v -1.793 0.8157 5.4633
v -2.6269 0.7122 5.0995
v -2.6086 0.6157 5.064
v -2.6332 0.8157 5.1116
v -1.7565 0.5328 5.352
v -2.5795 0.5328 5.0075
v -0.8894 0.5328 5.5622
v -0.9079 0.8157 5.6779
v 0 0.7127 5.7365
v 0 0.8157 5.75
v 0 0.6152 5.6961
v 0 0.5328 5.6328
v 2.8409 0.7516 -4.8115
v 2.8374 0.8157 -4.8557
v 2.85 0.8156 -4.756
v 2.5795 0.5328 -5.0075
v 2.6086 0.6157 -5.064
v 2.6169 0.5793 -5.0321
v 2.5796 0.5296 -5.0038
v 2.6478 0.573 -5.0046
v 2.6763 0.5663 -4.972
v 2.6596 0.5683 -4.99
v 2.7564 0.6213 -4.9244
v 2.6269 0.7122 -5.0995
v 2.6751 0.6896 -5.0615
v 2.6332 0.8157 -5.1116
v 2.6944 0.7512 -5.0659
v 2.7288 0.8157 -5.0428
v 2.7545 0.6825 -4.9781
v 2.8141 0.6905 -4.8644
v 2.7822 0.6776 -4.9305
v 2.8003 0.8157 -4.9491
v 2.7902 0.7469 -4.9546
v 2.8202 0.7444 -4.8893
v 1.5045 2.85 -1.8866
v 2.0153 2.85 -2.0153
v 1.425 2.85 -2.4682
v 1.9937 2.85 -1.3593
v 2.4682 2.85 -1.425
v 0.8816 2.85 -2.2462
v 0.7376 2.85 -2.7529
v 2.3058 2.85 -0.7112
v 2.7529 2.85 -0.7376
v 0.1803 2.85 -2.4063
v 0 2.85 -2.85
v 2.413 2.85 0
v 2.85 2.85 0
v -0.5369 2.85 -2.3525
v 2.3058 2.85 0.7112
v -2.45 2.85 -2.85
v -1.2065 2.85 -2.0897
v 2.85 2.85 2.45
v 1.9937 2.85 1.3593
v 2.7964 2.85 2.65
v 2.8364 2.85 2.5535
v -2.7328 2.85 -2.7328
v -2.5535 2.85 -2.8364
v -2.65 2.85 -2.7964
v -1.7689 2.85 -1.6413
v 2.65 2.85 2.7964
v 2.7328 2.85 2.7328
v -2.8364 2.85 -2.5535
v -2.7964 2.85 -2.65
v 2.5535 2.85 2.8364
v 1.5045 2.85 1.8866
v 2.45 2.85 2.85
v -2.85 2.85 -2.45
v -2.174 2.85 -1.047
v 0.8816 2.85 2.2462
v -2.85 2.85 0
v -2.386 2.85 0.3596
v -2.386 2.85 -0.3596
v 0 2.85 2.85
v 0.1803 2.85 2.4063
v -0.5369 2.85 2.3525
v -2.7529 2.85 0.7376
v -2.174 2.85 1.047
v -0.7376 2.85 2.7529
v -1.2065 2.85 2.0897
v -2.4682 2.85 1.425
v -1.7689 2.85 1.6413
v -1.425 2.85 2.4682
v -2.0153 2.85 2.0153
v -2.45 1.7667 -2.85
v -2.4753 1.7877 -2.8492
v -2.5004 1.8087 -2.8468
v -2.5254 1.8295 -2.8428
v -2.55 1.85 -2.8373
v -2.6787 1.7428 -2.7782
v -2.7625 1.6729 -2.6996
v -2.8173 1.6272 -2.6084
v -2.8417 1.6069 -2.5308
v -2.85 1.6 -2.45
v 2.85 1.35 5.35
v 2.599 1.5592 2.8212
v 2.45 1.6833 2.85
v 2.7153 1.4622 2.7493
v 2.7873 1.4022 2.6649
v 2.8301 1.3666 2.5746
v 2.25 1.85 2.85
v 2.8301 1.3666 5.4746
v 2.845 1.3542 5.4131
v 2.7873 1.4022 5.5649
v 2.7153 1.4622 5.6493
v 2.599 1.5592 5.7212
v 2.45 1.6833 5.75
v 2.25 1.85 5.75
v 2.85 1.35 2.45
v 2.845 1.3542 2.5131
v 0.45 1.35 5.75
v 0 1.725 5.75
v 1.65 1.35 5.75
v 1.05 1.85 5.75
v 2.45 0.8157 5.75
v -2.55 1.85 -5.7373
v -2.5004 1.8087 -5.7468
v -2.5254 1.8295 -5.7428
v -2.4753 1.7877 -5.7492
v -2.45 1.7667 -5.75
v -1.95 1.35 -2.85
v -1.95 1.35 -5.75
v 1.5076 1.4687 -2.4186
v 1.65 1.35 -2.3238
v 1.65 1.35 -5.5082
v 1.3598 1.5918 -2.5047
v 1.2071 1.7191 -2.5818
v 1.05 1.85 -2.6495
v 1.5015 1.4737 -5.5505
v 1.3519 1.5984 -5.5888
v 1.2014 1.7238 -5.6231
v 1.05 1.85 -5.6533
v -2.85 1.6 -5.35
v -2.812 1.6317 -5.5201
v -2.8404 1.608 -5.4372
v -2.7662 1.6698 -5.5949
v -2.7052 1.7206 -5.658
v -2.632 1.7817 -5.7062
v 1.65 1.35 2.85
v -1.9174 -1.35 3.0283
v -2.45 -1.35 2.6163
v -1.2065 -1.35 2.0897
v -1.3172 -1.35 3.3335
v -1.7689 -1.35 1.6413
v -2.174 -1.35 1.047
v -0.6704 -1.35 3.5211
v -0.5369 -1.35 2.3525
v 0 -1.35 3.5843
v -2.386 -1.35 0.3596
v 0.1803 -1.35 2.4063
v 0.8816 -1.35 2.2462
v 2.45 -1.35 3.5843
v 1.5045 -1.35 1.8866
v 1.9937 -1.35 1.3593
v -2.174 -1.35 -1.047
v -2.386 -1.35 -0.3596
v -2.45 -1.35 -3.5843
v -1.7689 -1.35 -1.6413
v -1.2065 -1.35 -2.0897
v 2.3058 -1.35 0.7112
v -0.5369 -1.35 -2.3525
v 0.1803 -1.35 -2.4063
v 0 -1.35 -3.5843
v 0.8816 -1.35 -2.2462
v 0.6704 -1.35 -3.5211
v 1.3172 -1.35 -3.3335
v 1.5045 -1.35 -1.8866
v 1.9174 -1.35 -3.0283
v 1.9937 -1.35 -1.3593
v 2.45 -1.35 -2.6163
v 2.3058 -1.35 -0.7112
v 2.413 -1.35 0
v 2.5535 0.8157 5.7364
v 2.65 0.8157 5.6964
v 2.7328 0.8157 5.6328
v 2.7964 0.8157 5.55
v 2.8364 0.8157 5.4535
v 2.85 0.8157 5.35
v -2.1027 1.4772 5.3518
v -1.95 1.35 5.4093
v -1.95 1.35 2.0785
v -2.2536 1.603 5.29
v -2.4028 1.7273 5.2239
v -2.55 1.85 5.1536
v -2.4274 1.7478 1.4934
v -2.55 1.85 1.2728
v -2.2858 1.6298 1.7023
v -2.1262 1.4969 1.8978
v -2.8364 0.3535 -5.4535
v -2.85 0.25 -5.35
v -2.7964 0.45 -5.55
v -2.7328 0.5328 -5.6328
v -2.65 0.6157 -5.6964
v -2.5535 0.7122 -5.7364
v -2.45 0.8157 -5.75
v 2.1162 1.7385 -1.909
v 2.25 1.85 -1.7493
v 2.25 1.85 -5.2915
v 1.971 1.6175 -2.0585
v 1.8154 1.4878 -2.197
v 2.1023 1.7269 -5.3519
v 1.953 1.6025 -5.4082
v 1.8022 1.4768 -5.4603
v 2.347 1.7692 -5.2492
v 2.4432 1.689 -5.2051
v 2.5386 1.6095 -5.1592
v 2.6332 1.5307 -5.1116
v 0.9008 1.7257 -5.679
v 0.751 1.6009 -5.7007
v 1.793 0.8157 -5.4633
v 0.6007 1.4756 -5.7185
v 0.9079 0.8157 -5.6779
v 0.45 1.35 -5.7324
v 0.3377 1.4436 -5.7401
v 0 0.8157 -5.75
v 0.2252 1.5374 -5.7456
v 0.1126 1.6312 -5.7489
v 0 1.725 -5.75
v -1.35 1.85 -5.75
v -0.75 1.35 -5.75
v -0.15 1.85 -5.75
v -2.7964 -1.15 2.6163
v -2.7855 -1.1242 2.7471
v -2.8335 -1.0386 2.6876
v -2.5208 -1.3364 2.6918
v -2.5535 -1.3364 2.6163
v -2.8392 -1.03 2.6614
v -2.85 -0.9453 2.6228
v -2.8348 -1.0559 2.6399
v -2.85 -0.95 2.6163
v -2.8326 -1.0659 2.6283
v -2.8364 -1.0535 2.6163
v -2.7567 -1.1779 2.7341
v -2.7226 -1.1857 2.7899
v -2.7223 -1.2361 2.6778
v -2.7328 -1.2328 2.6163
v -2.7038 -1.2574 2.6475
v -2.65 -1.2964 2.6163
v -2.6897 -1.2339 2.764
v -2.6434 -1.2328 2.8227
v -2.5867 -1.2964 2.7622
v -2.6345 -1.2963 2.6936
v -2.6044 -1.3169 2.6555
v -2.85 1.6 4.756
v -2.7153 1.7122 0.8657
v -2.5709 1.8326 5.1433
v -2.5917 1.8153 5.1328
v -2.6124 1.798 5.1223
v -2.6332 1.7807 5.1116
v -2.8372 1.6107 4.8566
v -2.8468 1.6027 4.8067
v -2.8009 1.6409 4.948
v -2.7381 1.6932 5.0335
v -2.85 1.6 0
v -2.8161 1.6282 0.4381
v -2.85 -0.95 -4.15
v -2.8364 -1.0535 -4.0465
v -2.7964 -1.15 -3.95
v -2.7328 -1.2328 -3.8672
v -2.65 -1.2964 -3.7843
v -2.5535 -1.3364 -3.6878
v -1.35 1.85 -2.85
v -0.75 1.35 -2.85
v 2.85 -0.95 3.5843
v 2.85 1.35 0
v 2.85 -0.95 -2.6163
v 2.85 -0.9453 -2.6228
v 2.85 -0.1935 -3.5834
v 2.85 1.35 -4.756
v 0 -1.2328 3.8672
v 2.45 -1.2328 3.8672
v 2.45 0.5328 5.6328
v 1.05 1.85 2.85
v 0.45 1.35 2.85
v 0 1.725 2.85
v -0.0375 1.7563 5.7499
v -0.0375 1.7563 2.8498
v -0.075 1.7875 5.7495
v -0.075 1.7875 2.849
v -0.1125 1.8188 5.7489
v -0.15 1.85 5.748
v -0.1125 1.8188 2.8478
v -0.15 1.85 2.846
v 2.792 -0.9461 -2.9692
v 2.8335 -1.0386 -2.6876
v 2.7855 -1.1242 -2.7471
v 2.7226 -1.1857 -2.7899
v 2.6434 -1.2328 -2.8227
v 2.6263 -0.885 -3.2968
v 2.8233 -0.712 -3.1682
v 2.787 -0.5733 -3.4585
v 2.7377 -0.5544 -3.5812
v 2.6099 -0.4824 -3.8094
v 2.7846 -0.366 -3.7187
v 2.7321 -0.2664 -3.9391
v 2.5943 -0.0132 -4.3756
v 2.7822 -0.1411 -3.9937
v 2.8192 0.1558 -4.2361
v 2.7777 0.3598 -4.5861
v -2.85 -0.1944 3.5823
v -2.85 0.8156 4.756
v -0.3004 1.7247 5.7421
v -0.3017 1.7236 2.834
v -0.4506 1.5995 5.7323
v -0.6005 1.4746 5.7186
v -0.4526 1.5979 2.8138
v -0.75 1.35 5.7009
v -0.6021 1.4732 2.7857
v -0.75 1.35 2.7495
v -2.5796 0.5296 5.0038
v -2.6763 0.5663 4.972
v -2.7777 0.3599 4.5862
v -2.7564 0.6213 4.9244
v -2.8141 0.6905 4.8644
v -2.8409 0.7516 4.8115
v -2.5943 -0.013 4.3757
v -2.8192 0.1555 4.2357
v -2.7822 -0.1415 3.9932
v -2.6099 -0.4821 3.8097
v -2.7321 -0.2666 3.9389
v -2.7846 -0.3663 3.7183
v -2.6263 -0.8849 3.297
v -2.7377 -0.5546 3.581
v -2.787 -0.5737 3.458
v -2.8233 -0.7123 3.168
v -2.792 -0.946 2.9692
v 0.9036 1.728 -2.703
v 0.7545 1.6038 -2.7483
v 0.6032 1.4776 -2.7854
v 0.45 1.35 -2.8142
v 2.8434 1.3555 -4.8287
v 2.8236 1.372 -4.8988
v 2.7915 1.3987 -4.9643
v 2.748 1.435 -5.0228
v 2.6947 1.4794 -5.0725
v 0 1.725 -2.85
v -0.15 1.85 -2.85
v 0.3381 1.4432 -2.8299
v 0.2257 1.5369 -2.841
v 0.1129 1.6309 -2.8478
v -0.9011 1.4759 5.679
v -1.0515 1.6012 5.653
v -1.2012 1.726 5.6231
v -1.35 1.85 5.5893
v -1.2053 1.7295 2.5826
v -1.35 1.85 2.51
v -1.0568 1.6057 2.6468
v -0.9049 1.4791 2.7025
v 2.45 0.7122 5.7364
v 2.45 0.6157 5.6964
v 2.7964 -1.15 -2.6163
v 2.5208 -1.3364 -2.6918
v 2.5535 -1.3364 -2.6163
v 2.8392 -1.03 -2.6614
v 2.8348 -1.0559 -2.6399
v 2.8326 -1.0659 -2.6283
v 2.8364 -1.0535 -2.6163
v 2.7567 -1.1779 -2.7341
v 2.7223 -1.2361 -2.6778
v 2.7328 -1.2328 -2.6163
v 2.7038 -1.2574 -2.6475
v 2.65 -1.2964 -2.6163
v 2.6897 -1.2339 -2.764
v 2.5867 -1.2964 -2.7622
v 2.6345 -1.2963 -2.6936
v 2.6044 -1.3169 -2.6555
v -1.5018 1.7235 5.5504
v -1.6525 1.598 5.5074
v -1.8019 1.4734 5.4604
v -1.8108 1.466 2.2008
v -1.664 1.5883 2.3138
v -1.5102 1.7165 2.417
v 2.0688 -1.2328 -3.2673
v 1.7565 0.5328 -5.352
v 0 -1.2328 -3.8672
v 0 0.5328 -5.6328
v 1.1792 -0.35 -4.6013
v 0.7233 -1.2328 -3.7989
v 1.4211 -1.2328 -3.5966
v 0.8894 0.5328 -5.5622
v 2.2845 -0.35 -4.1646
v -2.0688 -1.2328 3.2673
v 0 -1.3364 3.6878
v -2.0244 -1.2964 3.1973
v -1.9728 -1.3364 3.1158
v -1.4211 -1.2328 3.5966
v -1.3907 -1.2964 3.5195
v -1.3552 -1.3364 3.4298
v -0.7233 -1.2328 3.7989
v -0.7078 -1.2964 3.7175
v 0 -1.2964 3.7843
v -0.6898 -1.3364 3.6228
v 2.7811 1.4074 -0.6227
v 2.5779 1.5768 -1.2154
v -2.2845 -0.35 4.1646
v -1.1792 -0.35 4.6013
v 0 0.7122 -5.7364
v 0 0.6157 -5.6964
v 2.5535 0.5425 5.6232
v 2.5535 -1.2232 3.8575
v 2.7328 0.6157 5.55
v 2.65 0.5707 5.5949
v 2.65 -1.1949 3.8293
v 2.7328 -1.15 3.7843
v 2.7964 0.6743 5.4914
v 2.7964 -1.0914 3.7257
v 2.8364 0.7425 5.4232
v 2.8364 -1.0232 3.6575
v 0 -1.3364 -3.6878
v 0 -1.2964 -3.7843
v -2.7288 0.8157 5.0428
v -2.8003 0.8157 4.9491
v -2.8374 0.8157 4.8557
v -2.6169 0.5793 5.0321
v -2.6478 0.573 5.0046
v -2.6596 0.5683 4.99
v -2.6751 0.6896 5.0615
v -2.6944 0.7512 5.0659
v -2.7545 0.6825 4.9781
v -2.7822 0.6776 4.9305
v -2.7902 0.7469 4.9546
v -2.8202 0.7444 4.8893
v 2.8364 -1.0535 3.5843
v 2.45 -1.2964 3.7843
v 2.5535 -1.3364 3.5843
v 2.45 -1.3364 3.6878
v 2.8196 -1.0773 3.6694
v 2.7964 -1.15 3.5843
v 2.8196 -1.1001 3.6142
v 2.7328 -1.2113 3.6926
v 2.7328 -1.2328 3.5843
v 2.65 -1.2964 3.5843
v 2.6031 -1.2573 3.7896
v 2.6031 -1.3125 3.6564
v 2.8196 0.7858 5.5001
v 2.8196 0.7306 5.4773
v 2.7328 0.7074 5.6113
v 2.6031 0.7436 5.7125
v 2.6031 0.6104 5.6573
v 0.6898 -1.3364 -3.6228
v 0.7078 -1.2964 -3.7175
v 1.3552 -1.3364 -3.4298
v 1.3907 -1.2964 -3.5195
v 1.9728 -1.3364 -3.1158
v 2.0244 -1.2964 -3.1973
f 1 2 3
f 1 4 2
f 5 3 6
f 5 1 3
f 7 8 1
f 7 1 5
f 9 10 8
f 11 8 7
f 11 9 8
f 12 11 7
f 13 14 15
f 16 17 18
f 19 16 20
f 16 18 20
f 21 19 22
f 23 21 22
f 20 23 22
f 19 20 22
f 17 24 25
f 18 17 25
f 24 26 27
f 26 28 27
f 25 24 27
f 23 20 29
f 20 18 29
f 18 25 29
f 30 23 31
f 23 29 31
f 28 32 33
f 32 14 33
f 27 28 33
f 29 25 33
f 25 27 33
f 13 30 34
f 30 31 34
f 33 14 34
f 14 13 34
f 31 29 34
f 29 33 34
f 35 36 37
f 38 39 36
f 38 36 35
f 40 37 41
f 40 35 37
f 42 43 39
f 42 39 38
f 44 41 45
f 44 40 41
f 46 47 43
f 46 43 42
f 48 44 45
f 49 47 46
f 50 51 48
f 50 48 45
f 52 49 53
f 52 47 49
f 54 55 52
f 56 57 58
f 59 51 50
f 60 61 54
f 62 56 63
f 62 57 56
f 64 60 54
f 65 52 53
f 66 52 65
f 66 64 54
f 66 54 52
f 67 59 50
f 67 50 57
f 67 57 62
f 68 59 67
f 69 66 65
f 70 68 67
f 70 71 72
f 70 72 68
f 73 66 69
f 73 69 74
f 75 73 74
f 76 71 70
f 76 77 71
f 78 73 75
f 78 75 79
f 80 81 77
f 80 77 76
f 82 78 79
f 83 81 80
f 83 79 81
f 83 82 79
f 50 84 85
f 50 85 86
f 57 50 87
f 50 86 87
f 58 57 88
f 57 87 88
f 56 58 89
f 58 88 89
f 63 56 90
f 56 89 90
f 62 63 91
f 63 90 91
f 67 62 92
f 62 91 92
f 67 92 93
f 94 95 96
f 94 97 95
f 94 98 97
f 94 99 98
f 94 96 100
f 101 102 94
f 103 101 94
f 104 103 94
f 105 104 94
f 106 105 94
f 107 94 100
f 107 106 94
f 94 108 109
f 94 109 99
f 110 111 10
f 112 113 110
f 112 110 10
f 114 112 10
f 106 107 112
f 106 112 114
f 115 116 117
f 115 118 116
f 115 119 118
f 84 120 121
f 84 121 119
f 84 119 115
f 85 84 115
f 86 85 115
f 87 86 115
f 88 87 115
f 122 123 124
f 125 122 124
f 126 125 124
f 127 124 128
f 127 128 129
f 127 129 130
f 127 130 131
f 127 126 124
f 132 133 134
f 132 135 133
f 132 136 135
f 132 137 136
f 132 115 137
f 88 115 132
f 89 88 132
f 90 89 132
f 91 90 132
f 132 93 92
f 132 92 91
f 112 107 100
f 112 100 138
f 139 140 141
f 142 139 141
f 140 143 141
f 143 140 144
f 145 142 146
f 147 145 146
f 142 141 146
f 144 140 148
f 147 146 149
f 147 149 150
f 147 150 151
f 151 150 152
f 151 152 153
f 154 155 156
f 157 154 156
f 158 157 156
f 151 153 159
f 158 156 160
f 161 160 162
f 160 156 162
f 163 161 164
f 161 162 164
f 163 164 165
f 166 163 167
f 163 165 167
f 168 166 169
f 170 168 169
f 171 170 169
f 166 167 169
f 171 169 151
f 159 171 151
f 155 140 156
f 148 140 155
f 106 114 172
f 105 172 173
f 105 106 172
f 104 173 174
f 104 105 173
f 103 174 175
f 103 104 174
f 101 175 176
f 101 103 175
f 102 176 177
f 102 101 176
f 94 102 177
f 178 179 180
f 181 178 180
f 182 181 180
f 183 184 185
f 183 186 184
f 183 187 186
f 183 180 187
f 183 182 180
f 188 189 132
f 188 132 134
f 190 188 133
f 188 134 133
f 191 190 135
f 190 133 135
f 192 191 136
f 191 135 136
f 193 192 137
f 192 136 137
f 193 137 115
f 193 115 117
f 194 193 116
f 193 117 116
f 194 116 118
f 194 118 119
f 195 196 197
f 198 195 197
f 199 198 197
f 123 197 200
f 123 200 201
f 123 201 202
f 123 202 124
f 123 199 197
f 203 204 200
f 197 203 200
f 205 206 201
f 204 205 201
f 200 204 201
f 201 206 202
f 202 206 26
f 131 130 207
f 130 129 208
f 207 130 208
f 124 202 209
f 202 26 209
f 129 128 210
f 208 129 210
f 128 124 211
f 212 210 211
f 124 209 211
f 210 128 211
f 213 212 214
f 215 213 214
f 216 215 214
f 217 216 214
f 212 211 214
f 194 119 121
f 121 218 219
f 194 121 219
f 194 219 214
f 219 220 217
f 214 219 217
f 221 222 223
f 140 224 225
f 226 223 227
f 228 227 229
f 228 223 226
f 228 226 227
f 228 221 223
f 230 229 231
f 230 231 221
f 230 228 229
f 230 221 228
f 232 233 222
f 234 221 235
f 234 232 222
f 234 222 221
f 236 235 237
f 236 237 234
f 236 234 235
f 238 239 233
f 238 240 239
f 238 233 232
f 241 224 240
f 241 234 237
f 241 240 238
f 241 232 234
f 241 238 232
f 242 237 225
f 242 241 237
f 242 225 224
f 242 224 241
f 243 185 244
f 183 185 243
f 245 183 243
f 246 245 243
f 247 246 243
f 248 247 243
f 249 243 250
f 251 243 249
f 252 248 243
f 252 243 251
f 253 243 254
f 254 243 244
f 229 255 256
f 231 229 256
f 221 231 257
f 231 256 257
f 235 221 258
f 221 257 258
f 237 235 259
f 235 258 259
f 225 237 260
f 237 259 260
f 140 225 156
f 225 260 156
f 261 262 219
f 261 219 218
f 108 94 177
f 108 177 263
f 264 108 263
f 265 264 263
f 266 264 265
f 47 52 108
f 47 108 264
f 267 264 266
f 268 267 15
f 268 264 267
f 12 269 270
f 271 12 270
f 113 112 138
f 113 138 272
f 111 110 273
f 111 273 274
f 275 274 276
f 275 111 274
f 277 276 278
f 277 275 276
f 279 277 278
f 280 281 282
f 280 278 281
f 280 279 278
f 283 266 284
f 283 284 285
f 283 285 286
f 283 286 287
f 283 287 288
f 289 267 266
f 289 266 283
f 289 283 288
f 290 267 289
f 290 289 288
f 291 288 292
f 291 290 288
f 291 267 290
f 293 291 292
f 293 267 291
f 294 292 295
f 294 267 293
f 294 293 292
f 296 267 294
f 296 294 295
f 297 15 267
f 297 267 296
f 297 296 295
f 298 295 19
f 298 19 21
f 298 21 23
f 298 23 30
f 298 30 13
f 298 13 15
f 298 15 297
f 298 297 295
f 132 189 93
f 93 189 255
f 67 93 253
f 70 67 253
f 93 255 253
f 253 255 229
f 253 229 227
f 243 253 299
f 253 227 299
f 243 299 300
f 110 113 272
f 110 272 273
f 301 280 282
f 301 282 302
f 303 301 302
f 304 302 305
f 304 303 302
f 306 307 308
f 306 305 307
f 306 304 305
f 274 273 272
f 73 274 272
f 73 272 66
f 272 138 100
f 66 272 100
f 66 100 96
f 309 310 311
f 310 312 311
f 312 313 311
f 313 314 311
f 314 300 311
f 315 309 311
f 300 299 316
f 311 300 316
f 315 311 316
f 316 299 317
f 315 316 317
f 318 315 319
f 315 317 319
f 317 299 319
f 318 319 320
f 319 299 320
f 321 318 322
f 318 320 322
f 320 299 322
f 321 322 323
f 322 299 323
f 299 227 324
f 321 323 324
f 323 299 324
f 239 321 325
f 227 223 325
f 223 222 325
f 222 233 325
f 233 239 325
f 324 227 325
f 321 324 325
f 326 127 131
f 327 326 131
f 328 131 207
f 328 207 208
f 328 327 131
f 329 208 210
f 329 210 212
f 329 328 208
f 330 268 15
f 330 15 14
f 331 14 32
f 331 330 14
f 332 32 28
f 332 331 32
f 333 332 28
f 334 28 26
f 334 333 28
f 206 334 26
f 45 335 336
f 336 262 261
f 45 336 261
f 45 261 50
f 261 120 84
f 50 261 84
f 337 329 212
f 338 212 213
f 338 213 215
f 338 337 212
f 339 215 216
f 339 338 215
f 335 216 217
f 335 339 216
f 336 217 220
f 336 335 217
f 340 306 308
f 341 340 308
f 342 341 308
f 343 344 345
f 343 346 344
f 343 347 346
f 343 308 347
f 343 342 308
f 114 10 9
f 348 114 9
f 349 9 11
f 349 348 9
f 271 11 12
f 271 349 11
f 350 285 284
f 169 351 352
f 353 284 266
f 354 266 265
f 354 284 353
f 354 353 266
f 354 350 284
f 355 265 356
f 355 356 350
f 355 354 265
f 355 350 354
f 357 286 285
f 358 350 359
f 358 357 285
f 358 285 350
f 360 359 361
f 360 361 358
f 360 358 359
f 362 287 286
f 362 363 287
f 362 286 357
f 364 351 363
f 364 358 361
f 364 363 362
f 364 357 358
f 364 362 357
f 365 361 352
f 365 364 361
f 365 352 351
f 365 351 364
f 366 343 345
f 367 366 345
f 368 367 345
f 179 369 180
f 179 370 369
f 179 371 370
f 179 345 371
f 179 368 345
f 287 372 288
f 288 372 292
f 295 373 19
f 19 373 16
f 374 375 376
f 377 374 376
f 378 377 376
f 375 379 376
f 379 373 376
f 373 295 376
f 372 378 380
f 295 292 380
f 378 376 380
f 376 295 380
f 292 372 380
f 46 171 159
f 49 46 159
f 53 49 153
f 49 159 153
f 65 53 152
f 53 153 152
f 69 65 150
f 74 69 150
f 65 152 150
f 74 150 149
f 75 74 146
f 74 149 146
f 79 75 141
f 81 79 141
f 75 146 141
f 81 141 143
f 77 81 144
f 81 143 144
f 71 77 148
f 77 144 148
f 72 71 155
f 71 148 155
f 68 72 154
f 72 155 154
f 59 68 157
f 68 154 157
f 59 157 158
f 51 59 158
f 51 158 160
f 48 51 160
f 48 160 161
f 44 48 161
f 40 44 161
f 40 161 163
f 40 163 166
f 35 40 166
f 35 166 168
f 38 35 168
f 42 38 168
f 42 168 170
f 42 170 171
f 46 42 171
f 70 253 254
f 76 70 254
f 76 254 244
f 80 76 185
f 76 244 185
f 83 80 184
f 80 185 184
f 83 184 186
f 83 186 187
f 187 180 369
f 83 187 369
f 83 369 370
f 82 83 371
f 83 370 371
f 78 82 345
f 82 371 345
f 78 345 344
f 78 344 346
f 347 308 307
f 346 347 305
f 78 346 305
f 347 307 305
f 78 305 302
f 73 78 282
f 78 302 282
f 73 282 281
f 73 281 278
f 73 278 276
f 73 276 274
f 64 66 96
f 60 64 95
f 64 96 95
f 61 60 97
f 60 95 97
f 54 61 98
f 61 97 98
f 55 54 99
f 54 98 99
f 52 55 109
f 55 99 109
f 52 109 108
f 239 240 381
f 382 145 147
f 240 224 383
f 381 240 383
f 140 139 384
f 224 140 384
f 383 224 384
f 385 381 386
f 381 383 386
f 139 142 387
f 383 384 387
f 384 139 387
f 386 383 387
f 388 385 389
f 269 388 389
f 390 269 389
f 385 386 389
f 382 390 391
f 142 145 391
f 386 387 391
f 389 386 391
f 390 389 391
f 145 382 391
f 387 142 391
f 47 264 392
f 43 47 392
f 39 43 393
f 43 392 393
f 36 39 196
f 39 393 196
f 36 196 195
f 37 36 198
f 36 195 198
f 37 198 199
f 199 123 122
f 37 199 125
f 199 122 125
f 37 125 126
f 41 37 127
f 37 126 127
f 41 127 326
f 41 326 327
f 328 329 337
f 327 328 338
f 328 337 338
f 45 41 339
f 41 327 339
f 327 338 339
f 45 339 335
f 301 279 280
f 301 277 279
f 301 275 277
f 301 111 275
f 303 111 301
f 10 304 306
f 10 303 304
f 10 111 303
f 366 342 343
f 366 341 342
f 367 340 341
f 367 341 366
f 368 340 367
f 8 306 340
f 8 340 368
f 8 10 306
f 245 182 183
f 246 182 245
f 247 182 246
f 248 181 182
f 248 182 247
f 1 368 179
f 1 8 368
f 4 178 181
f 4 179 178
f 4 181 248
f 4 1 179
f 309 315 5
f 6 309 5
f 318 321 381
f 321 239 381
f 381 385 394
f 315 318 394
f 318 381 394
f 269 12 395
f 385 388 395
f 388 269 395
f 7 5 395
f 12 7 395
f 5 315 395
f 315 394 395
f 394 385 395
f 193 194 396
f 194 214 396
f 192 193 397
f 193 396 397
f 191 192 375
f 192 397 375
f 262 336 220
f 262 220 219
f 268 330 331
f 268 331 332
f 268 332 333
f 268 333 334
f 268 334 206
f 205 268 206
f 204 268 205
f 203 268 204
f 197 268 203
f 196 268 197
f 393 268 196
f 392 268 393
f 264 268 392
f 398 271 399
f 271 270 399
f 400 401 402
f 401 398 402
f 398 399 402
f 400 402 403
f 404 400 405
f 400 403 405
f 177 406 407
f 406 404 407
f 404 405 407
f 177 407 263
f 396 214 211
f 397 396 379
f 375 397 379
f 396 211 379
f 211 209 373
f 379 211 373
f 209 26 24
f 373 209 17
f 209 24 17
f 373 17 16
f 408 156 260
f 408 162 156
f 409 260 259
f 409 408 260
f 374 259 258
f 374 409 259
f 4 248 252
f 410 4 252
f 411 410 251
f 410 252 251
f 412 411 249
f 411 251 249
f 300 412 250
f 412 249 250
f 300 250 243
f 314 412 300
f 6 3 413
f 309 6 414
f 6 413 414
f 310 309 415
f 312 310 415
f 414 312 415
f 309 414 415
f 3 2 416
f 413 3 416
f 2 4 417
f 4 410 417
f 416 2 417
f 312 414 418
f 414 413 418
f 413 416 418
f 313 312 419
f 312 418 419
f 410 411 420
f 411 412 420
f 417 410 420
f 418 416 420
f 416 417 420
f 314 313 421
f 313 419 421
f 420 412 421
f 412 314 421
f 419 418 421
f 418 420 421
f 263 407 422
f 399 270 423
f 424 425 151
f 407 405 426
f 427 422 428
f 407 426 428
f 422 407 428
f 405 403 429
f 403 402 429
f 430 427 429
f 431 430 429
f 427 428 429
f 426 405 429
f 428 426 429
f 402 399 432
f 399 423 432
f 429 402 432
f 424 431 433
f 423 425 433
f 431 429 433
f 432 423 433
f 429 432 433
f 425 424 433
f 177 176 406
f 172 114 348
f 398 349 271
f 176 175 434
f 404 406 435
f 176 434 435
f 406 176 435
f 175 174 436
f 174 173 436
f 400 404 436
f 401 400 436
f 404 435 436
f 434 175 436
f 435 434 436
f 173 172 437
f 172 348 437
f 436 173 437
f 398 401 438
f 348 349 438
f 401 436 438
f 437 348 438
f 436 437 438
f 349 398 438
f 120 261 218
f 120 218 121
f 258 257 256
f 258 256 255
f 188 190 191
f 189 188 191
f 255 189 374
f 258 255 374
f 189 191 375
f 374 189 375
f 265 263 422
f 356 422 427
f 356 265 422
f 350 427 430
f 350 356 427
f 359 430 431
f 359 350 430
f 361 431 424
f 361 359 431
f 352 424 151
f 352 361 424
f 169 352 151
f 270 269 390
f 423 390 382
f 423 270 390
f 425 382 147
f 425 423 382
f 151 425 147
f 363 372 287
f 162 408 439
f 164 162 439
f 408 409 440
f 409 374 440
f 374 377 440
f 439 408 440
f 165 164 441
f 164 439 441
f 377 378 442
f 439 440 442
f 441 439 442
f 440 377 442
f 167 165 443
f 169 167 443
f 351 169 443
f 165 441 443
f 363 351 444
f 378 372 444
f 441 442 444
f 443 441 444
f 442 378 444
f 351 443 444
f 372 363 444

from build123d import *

# Parameters (mm, degrees)
SKETCH1_W                        = 5.7
SKETCH1_H                        = 11.5
BOSS_EXTRUDE1_DEPTH              = 1.35
BOSS_EXTRUDE2_DEPTH              = 11.5
BOSS_EXTRUDE4_DEPTH              = 1.5
CUT_EXTRUDE3_DEPTH               = 3.5
CHAMFER2_SIZE                    = 2
F_10_32_TAPPED_HOLE3_D           = 4.0386
F_10_32_TAPPED_HOLE3_DEPTH       = 12.02944
F_10_32_TAPPED_HOLE3_CBORE_D     = 4.826
F_10_32_TAPPED_HOLE3_CBORE_DEPTH = 9.652
F_10_32_TAPPED_HOLE3_TIP         = 1.213317848
FILLET2_R                        = 0.4


with BuildPart() as part:
    # Sketch1 → Boss-Extrude1 (new, symmetric)
    with BuildSketch(Plane(origin=(0, 0, 0), x_dir=(1, 0, 0), z_dir=(0, 1, 0))):
        Rectangle(SKETCH1_W, SKETCH1_H)
    extrude(amount=BOSS_EXTRUDE1_DEPTH, both=True)

    # Sketch2 → Boss-Extrude2 (add)
    with BuildSketch(Plane.XY.offset(5.75)):
        Polygon((-2.85, 1.35), (-1.95, 1.35), (-2.55, 1.85), (-2.85, 1.6), align=None)
        Polygon((-1.95, 1.35), (-0.75, 1.35), (-1.35, 1.85), align=None)
        Polygon((-0.75, 1.35), (0.45, 1.35), (-0.15, 1.85), align=None)
        Polygon((0.45, 1.35), (1.65, 1.35), (1.05, 1.85), align=None)
        Polygon((2.85, 1.35), (2.25, 1.85), (1.65, 1.35), align=None)
    extrude(amount=-BOSS_EXTRUDE2_DEPTH)

    # Sketch7 → Boss-Extrude4 (add)
    with BuildSketch(Plane.XZ.offset(-1.35)):
        with BuildLine():
            Line((0, 2.85), (2.45, 2.85))
            ThreePointArc((2.45, 2.85), (2.732842712, 2.732842712), (2.85, 2.45))
            Line((2.85, 2.45), (2.85, 0))
            ThreePointArc((2.85, 0), (2.015254326, -2.015254326), (0, -2.85))
            Line((0, -2.85), (-2.45, -2.85))
            ThreePointArc((-2.45, -2.85), (-2.732842712, -2.732842712), (-2.85, -2.45))
            Line((-2.85, -2.45), (-2.85, 0))
            ThreePointArc((-2.85, 0), (-2.015254326, 2.015254326), (0, 2.85))
        make_face()
    extrude(amount=-BOSS_EXTRUDE4_DEPTH)

    # Sketch8 → Cut-Extrude3 (cut)
    with BuildSketch(Plane.XZ.offset(1.35)):
        with BuildLine():
            Line((-2.85, 4.993996396), (-2.85, 5.75))
            Line((-2.85, 5.75), (0, 5.75))
            ThreePointArc((0, 5.75), (-1.474282999, 5.557786397), (-2.85, 4.993996396))
        make_face()
        with BuildLine():
            Line((0, -5.75), (2.85, -5.75))
            Line((2.85, -5.75), (2.85, -4.993996396))
            ThreePointArc((2.85, -4.993996396), (1.474282999, -5.557786397), (0, -5.75))
        make_face()
    extrude(amount=-CUT_EXTRUDE3_DEPTH, mode=Mode.SUBTRACT)

    # Chamfer2
    chamfer2_edges = [part.edges().sort_by_distance(p)[0] for p in [
        (1.425, -1.35, 5.75),
        (-1.474282999, -1.35, 5.557786397),
        (-1.425, -1.35, -5.75),
        (1.474282999, -1.35, -5.557786397),
    ]]
    chamfer(chamfer2_edges, length=CHAMFER2_SIZE)

    # #10-32 Tapped Hole3
    with Locations(Plane.XZ.offset(1.35)):
        with Locations((0, 0)):
            CounterBoreHole(F_10_32_TAPPED_HOLE3_D / 2, F_10_32_TAPPED_HOLE3_CBORE_D / 2, F_10_32_TAPPED_HOLE3_CBORE_DEPTH, depth=F_10_32_TAPPED_HOLE3_DEPTH)
            with Locations((0, 0, -(F_10_32_TAPPED_HOLE3_DEPTH + F_10_32_TAPPED_HOLE3_TIP / 2))):  # 118° drill point
                Cone(0, F_10_32_TAPPED_HOLE3_D / 2, F_10_32_TAPPED_HOLE3_TIP, mode=Mode.SUBTRACT)

    # Fillet2
    fillet2_edges = [part.edges().sort_by_distance(p)[0] for p in [
        (1.425, 0.65, 5.75),
        (1.425, -1.35, 3.75),
        (-1.425, 0.65, -5.75),
        (-1.425, -1.35, -3.75),
        (-1.474282999, 0.65, 5.557786397),
        (-1.568909939, -1.35, 3.406027246),
        (-2.85, -0.391617372, 3.747848312),
        (1.474282999, 0.65, -5.557786397),
        (1.568909939, -1.35, -3.406027246),
        (2.85, -0.391617372, -3.747848312),
        (2.85, 1, 5.75),
        (2.85, -0.35, 4.75),
        (-2.85, 1.125, 4.993996396),
        (-2.85, -1.35, -0.656394239),
        (-2.85, 1.125, -5.75),
        (2.85, -1.35, 0.656394239),
        (2.85, 1, -4.993996396),
    ]]
    fillet(fillet2_edges, radius=FILLET2_R)


solid = part.part
